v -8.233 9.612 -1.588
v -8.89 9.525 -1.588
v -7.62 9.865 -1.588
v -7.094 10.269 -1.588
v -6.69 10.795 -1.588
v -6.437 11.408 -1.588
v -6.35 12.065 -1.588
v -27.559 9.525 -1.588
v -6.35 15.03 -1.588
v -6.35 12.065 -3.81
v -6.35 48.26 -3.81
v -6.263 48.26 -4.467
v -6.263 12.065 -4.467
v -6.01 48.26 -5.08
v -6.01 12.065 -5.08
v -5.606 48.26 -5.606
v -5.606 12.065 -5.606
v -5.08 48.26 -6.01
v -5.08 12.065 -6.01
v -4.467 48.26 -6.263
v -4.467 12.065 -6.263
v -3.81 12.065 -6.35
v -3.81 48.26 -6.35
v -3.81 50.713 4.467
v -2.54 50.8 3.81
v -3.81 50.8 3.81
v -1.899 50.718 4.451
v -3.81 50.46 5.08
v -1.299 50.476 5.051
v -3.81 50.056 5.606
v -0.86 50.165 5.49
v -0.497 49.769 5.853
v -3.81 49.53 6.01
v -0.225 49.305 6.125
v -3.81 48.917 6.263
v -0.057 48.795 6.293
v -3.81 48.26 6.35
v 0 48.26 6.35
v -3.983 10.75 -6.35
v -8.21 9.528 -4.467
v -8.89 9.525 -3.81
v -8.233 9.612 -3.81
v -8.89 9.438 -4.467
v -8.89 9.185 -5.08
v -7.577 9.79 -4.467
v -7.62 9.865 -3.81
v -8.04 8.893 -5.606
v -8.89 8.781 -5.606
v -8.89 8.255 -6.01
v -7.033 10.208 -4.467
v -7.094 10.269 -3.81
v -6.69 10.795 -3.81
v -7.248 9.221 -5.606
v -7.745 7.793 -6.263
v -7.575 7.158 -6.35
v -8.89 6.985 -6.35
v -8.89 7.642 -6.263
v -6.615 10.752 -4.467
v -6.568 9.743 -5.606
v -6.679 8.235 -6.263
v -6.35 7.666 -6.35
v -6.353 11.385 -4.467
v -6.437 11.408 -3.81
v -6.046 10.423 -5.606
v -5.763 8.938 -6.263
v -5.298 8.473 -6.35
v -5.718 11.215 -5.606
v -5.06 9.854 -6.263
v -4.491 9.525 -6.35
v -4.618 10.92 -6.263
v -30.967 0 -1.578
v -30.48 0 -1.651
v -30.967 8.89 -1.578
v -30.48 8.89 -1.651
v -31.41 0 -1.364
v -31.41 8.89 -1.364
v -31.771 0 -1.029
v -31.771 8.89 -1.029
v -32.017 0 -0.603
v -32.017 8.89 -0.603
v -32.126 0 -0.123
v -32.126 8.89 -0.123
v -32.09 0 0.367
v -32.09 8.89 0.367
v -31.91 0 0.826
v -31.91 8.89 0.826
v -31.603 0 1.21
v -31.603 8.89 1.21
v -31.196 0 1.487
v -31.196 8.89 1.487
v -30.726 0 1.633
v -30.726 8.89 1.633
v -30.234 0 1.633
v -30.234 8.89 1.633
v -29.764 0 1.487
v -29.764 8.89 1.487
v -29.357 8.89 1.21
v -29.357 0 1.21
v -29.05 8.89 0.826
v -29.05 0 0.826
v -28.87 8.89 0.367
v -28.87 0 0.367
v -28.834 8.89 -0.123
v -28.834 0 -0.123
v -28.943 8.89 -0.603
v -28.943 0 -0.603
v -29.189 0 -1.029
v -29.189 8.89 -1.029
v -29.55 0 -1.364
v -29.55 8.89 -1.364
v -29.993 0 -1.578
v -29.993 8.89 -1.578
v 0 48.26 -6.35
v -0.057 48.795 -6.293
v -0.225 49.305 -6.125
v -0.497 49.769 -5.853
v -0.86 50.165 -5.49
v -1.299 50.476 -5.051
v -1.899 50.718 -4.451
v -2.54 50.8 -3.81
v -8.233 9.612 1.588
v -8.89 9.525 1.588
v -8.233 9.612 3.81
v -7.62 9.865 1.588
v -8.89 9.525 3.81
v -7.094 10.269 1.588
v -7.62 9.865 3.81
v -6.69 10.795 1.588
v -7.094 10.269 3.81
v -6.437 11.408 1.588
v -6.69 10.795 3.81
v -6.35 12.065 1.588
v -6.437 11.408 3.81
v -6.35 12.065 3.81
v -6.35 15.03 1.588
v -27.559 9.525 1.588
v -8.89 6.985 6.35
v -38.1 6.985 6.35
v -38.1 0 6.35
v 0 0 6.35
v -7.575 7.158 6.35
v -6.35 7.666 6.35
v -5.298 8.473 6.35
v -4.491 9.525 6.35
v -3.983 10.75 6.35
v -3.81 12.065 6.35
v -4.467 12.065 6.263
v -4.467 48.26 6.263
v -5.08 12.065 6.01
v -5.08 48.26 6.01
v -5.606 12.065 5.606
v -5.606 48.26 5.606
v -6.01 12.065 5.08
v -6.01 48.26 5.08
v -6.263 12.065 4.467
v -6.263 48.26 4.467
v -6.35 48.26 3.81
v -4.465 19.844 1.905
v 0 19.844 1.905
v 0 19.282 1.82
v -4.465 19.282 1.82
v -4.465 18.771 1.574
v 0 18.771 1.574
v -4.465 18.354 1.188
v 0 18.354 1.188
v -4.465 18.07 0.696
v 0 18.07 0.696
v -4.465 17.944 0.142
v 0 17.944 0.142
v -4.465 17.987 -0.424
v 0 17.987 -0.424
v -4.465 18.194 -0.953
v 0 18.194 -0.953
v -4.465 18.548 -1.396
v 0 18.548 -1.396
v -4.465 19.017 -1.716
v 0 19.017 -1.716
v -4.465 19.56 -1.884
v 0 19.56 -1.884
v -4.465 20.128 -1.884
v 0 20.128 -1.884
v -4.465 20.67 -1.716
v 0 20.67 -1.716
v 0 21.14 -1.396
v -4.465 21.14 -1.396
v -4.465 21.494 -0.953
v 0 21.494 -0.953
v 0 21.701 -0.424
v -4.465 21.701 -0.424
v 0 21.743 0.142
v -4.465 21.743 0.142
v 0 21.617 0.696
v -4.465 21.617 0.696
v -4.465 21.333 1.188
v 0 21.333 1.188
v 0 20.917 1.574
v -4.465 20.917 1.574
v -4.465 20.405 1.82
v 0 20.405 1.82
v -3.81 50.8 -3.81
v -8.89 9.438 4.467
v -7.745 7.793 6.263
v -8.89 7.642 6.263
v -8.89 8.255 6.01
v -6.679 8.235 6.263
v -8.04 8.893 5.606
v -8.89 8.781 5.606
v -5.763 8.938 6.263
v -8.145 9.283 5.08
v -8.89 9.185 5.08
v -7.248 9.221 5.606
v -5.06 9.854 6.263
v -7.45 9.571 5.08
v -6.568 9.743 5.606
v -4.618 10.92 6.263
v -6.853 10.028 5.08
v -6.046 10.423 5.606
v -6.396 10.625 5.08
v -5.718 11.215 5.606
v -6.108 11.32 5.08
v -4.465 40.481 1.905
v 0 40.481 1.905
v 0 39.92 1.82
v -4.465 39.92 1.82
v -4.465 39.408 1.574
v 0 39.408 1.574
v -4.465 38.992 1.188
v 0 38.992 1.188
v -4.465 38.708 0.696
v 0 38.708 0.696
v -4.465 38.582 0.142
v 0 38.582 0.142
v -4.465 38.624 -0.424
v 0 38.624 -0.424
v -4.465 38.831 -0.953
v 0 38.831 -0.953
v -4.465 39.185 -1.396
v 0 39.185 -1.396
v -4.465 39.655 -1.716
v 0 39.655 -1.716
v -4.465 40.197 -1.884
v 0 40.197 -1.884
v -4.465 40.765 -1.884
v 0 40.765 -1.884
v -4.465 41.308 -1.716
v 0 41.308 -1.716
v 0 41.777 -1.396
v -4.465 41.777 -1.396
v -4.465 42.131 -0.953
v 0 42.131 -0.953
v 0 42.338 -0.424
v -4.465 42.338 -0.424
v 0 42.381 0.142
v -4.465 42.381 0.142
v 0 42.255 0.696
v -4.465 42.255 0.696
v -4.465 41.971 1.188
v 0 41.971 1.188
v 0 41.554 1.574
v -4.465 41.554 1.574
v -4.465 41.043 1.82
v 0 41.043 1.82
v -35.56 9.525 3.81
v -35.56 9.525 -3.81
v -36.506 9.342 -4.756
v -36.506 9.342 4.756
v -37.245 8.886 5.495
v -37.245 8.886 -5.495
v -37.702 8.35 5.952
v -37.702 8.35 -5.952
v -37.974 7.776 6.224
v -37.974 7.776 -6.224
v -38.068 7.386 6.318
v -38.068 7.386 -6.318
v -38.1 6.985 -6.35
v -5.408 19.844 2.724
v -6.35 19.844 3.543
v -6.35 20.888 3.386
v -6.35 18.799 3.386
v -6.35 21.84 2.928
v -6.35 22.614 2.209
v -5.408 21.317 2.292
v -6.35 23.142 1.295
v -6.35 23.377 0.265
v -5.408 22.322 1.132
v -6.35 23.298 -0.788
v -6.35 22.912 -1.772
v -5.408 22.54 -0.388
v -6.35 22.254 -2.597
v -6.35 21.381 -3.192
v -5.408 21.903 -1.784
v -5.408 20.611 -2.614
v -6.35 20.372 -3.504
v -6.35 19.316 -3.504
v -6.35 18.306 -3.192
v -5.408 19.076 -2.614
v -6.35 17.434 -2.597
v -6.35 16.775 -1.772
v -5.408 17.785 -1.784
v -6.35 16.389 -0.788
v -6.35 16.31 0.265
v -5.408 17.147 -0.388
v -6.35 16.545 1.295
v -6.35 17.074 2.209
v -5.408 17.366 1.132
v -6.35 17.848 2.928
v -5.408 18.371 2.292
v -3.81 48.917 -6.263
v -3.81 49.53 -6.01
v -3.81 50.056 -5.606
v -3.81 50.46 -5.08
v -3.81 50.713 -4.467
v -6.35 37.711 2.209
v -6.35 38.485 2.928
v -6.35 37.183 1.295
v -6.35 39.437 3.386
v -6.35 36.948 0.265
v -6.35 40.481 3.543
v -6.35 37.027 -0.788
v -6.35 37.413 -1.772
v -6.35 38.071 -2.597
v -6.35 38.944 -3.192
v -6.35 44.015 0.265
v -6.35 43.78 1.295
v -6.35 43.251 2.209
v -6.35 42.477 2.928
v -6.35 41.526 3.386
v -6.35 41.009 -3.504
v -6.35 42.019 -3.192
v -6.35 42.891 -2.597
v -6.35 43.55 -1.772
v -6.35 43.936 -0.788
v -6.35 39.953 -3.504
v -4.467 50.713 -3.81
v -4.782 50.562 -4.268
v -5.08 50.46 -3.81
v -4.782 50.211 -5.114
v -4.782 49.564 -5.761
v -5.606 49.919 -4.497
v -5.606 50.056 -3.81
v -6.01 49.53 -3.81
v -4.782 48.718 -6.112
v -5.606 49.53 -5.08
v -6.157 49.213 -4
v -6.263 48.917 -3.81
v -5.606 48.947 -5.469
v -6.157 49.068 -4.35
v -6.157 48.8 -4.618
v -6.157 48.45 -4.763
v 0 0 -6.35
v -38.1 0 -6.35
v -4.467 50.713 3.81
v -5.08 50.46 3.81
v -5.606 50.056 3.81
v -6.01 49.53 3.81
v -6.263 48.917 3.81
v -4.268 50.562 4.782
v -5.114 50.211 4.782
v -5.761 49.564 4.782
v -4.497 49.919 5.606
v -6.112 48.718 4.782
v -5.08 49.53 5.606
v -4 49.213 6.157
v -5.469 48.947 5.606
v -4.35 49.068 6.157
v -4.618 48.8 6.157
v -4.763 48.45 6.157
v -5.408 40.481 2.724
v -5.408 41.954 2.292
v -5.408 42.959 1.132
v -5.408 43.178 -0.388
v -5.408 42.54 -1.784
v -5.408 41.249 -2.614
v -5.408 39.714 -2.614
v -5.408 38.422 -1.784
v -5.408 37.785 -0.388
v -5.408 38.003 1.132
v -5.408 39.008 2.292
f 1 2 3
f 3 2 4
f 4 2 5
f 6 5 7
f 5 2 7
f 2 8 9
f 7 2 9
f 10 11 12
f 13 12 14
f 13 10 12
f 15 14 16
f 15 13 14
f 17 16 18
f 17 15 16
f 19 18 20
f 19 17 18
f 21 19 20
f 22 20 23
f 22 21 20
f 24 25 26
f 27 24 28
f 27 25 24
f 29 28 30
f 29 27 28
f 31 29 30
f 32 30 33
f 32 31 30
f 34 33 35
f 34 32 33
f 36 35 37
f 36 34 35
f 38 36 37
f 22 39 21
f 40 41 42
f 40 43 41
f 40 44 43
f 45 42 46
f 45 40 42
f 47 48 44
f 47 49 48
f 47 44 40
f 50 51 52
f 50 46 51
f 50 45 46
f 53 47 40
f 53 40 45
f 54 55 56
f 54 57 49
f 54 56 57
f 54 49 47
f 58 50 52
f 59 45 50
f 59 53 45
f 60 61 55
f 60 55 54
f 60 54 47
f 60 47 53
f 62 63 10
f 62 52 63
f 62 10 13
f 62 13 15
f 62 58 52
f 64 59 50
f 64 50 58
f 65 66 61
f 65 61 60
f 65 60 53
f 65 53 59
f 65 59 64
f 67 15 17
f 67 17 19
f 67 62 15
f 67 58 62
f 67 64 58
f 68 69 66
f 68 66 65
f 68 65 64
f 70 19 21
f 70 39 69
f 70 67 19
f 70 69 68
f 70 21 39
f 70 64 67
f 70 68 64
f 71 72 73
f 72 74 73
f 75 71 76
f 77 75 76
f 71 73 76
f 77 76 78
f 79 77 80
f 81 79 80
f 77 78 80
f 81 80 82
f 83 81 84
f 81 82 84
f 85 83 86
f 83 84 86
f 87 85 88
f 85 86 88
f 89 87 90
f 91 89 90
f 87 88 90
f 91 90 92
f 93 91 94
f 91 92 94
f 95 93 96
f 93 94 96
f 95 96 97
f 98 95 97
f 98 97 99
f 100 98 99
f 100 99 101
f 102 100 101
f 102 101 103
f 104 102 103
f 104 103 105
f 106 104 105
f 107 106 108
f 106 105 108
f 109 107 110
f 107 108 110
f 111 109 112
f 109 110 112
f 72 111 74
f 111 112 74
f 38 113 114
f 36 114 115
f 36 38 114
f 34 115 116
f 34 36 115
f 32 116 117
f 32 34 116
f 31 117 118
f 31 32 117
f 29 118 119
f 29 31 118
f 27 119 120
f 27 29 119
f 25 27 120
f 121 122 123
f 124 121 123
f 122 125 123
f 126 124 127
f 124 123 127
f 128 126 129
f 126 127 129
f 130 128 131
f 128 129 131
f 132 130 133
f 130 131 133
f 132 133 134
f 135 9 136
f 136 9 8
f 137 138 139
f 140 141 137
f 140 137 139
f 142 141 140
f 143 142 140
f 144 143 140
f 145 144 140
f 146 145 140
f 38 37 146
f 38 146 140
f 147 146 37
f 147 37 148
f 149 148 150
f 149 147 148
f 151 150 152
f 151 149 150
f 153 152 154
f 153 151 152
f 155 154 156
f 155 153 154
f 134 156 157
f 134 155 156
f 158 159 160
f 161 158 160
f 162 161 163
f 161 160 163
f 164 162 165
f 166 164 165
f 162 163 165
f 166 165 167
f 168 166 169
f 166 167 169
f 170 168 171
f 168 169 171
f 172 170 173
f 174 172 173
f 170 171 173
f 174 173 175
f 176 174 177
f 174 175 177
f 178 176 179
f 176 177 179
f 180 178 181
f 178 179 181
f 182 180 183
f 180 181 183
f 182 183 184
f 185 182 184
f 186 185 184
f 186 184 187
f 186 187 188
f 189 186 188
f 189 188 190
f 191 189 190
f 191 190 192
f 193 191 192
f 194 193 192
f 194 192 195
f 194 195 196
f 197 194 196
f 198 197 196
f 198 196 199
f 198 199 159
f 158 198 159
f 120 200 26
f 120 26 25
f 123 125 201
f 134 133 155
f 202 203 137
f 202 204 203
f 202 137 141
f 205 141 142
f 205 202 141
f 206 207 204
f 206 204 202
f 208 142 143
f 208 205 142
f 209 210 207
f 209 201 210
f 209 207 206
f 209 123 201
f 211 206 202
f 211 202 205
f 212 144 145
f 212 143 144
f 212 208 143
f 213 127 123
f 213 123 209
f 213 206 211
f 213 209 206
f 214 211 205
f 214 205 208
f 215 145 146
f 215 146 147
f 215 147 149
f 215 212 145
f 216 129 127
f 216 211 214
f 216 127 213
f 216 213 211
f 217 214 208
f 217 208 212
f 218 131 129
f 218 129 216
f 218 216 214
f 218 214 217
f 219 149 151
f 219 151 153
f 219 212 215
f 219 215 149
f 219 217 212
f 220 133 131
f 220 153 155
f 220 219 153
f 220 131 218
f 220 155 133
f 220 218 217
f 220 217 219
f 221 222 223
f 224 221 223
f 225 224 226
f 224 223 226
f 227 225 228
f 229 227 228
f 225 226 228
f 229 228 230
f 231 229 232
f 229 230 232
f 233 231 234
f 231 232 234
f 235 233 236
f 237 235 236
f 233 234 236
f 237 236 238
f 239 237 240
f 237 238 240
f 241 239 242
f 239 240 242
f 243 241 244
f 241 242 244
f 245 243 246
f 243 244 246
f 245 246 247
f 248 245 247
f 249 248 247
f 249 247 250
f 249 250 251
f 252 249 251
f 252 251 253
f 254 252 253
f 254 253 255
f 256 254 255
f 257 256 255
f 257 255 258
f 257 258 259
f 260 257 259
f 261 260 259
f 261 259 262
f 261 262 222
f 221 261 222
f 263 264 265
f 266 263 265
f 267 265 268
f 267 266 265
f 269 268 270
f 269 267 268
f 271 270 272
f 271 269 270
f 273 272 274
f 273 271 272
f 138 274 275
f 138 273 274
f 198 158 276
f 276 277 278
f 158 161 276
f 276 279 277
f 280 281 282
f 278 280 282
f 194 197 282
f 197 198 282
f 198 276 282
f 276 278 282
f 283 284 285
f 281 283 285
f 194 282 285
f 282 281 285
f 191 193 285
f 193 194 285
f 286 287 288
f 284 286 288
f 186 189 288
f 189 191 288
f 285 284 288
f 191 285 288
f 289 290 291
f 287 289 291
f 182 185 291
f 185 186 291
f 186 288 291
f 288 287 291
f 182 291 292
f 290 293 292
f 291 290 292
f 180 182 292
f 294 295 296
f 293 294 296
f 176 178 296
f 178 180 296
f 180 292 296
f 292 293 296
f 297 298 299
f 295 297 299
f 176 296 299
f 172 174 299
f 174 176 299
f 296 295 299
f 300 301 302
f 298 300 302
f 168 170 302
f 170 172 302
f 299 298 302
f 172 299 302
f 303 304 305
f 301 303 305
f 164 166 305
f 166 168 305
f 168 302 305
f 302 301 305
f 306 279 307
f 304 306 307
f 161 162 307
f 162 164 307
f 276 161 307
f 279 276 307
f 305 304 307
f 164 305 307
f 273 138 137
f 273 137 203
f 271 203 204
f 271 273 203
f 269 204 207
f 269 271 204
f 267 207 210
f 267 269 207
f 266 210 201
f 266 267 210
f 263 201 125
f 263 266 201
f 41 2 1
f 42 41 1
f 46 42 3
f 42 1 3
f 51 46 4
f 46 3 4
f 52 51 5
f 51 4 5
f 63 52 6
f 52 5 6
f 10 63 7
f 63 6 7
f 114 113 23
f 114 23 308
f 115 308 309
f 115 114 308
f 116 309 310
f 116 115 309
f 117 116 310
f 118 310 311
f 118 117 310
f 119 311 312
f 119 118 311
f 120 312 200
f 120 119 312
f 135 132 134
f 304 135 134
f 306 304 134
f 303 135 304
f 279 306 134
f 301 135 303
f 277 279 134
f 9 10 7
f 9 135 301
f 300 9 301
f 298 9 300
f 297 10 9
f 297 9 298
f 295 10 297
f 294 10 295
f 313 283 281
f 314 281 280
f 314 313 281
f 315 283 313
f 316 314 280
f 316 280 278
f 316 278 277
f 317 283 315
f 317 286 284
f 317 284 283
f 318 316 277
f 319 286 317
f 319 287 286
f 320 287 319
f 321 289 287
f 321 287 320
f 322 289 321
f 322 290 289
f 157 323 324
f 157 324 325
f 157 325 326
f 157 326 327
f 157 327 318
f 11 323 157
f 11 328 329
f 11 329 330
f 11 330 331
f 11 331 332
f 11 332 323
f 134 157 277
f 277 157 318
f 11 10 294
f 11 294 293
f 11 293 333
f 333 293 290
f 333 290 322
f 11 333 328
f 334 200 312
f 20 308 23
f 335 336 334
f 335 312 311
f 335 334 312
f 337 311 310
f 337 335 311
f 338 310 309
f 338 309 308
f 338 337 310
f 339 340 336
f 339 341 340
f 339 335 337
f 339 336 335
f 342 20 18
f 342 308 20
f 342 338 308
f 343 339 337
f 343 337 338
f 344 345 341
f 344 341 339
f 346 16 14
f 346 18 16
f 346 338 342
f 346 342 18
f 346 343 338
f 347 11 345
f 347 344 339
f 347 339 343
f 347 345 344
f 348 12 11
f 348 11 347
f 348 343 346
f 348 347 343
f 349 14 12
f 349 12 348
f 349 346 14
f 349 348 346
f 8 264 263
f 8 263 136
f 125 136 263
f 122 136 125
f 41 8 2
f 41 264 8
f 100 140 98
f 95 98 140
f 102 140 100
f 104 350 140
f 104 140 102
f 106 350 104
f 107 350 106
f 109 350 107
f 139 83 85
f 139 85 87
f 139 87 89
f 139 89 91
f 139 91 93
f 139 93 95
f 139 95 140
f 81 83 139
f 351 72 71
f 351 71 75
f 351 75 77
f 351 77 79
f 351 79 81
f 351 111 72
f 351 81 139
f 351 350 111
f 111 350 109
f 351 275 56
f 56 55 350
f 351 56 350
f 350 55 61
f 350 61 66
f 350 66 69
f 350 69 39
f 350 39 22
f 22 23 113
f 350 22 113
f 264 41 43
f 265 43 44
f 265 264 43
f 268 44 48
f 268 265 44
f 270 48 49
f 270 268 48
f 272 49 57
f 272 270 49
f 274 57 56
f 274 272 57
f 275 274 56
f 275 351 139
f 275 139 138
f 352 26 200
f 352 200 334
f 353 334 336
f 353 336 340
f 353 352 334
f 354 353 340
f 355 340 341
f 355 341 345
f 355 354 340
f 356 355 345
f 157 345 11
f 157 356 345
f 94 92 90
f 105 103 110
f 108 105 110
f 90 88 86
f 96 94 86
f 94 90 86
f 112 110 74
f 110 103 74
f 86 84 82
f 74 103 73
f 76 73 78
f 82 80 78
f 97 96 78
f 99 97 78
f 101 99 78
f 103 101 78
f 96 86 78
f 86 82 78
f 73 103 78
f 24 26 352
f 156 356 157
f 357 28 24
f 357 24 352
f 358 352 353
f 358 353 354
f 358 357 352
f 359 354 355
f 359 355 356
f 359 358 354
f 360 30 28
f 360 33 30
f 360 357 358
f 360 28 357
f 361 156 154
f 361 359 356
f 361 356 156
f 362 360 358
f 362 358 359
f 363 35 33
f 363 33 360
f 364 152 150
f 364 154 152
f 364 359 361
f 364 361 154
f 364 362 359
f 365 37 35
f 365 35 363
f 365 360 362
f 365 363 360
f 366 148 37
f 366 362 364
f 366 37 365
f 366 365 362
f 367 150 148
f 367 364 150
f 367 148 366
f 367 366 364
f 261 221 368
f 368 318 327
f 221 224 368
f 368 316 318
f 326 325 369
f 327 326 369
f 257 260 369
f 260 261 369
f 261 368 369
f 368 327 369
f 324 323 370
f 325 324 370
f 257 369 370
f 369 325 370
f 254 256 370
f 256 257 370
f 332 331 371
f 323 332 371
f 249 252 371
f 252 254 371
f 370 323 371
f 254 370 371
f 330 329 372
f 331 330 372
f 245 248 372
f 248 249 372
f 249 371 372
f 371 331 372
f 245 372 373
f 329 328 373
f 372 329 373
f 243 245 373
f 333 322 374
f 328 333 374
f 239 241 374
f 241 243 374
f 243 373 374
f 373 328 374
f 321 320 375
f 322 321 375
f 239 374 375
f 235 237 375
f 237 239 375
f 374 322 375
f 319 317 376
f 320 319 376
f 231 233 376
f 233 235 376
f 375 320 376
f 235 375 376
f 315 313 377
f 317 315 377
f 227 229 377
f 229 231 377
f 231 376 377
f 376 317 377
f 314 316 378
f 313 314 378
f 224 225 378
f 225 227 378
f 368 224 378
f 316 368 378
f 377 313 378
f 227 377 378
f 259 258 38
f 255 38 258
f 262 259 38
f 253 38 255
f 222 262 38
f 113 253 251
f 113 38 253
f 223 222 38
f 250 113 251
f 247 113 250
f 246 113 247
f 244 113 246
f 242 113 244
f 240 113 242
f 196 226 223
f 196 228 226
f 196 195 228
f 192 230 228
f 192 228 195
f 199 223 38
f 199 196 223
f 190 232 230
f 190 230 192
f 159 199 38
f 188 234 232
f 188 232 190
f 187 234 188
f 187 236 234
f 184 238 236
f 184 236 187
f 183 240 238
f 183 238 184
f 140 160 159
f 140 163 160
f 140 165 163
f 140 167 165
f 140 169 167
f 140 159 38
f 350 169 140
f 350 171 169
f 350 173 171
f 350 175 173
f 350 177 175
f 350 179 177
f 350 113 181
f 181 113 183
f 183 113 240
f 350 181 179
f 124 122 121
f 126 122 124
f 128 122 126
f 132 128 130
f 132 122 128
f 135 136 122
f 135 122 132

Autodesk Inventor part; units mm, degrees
ref_plane "YZ Plane" through (0, 0, 0) normal (1, 0, 0) x (0, 1, 0)
ref_plane "XZ Plane" through (0, 0, 0) normal (0, 1, 0) x (-1, 0, 0)
ref_plane "XY Plane" through (0, 0, 0) normal (0, 0, 1) x (1, 0, 0)
sketch "Sketch1" plane through (0, 0, 0) normal (0, 0, 1) x (1, 0, 0)
  line L0 (0, 0) -> (-38.1, 0)
  line L1 (-38.1, 0) -> (-38.1, 9.525)
  line L2 (-38.1, 9.525) -> (-6.35, 9.525)
  line L3 (-6.35, 9.525) -> (-6.35, 50.8)
  line L4 (-6.35, 50.8) -> (0, 50.8)
  line L5 (0, 50.8) -> (0, 0)
  dimension "d0" = 38.1
  dimension "d1" = 9.525
  dimension "d2" = 50.8
  dimension "d3" = 6.35
extrude "Extrusion1" add sketch "Sketch1" along normal mid plane 12.7
sketch "Sketch2" plane through (-6.35, 9.525, 6.35) normal (-1, 0, 0) x (0, 0, 1)
  line L0 (-12.7, 41.275) -> (0, 41.275) construction
  line L1 (-6.35, 41.275) -> (-6.35, 0) construction
  line L2 (-12.7, 0) -> (0, 0) construction
  point P0 (-6.35, -9.525)
  point P1 (-6.35, 30.9563)
  point P2 (-6.35, 10.3188)
  dimension "d6" = 10.3187
  dimension "d7" = 10.3187
hole "Hole1" at (-6.35, 40.4812, 0) at (-6.35, 19.8438, 0) direction (1, 0, 0) diameter 3.81 end through all countersink diameter 7.0866 countersink angle 82 clearance for "Flat Head Machine Screw (82)" size "#6" standard "Ansi Unified Screw Threads"
sketch "Sketch3" plane through (-38.1, 0, 6.35) normal (0, -1, 0) x (1, 0, 0)
  line L0 (38.1, -6.35) -> (0, -6.35) construction
  line L1 (0, -12.7) -> (0, 0) construction
  line L2 (38.1, -12.7) -> (38.1, 0) projected
  point P0 (7.62, -6.35)
  dimension "d15" = 30.48
hole "Hole2" at (-30.48, 0, 0) direction (0, 1, 0) diameter 3.302 depth 8.89 thread size "8-32 UNC" class "2B" standard "ANSI Unified Screw Threads"
fillet "FilletForTop" radius 2.54 4 edges at (-6.35, 50.8, 0) (-3.175, 50.8, 6.35) (0, 50.8, 0) (-3.175, 50.8, -6.35)
fillet "FilletForFront" radius 2.54 8 edges at (-5.6061, 50.0561, -5.6061) (-6.35, 28.8925, -6.35) (-5.6061, 50.0561, 5.6061) (-6.35, 28.8925, 6.35) (-6.35, 9.525, 0) (-38.1, 9.525, 0) (-22.225, 9.525, 6.35) (-22.225, 9.525, -6.35)
sketch "Sketch4" plane through (0, 0, 0) normal (0, 0, 1) x (1, 0, 0)
  line L0 (-6.35, 48.26) -> (-6.35, 12.065) projected
  line L1 (-8.89, 9.525) -> (-35.56, 9.525) projected
  line L2 (-6.35, 15.0304) -> (-27.559, 9.525)
  line L3 (-4.4654, 17.9387) -> (-6.35, 16.3004) projected
  line L4 (-28.829, 8.89) -> (-28.829, 0) projected
  line L5 (-6.35, 15.0304) -> (-6.35, 9.525)
  line L6 (-6.35, 9.525) -> (-27.559, 9.525)
  point P0 (0, 0)
  point P1 (-6.35, 12.065)
  dimension "d26" = 1.27
  dimension "d27" = 1.27
extrude "Extrusion2" add sketch "Sketch4" along normal mid plane 3.175
equation "\"d0\" = distanceFromWall"
equation "\"d1\" = baseThickness"
equation "\"d2\" = wallHeight"
equation "\"d3\" = wallThickness"
equation "\"d4\" = width"
equation "\"d6\" = wallHoleCentersDistanceFromEnd"
equation "\"d7\" = wallHoleCentersDistanceFromEnd"
equation "\"d15\" = lightHoleDistanceFromWall"
equation "\"d28\" = 0.25 * width"
equation "\"baseThickness\" = 9.525"
equation "\"wallThickness\" = 6.35"
equation "\"distanceFromWall\" = 38.1"
equation "\"wallHeight\" = 50.8"
equation "\"width\" = 12.7"
equation "\"baseHeight\" = wallHeight - baseThickness"
equation "\"wallHoleCentersDistanceFromEnd\" = 0.25 * baseHeight"
equation "\"lightHoleDistanceFromWall\" = 30.48"
equation "\"screwDepth\" = 7.62"
properties part number "LightLBracket" material "PC/ABS Plastic"
